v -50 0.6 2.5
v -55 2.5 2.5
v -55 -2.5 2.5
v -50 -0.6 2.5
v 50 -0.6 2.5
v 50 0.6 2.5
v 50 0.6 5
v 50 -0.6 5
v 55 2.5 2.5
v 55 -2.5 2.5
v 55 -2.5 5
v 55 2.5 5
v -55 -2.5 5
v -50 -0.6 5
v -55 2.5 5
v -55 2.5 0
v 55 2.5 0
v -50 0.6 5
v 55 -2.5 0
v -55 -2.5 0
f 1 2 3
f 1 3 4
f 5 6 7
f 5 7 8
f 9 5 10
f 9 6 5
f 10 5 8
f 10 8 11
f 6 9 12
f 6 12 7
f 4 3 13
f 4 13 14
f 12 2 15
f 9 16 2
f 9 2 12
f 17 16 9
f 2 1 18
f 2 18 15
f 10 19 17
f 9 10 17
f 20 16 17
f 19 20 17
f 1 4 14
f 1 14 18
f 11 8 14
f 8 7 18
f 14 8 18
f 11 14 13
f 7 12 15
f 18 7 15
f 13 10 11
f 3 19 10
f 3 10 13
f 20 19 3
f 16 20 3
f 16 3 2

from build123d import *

# Parameters (mm, degrees)
SKETCH_W     = 110
SKETCH_H     = 5
PAD_DEPTH    = 2.5
PAD001_DEPTH = 2.5


with BuildPart() as part:
    # Sketch → Pad (new body)
    with BuildSketch(Plane.XY):
        Rectangle(SKETCH_W, SKETCH_H)
    extrude(amount=PAD_DEPTH)

    # Sketch001 → Pad001 (new body)
    with BuildSketch(Plane.XY.offset(2.5)):
        Polygon((-55, 2.5), (55, 2.5), (50, 0.6), (50, -0.6), (55, -2.5), (-55, -2.5), (-50, -0.6), (-50, 0.6), align=None)
    extrude(amount=PAD001_DEPTH)


solid = part.part
